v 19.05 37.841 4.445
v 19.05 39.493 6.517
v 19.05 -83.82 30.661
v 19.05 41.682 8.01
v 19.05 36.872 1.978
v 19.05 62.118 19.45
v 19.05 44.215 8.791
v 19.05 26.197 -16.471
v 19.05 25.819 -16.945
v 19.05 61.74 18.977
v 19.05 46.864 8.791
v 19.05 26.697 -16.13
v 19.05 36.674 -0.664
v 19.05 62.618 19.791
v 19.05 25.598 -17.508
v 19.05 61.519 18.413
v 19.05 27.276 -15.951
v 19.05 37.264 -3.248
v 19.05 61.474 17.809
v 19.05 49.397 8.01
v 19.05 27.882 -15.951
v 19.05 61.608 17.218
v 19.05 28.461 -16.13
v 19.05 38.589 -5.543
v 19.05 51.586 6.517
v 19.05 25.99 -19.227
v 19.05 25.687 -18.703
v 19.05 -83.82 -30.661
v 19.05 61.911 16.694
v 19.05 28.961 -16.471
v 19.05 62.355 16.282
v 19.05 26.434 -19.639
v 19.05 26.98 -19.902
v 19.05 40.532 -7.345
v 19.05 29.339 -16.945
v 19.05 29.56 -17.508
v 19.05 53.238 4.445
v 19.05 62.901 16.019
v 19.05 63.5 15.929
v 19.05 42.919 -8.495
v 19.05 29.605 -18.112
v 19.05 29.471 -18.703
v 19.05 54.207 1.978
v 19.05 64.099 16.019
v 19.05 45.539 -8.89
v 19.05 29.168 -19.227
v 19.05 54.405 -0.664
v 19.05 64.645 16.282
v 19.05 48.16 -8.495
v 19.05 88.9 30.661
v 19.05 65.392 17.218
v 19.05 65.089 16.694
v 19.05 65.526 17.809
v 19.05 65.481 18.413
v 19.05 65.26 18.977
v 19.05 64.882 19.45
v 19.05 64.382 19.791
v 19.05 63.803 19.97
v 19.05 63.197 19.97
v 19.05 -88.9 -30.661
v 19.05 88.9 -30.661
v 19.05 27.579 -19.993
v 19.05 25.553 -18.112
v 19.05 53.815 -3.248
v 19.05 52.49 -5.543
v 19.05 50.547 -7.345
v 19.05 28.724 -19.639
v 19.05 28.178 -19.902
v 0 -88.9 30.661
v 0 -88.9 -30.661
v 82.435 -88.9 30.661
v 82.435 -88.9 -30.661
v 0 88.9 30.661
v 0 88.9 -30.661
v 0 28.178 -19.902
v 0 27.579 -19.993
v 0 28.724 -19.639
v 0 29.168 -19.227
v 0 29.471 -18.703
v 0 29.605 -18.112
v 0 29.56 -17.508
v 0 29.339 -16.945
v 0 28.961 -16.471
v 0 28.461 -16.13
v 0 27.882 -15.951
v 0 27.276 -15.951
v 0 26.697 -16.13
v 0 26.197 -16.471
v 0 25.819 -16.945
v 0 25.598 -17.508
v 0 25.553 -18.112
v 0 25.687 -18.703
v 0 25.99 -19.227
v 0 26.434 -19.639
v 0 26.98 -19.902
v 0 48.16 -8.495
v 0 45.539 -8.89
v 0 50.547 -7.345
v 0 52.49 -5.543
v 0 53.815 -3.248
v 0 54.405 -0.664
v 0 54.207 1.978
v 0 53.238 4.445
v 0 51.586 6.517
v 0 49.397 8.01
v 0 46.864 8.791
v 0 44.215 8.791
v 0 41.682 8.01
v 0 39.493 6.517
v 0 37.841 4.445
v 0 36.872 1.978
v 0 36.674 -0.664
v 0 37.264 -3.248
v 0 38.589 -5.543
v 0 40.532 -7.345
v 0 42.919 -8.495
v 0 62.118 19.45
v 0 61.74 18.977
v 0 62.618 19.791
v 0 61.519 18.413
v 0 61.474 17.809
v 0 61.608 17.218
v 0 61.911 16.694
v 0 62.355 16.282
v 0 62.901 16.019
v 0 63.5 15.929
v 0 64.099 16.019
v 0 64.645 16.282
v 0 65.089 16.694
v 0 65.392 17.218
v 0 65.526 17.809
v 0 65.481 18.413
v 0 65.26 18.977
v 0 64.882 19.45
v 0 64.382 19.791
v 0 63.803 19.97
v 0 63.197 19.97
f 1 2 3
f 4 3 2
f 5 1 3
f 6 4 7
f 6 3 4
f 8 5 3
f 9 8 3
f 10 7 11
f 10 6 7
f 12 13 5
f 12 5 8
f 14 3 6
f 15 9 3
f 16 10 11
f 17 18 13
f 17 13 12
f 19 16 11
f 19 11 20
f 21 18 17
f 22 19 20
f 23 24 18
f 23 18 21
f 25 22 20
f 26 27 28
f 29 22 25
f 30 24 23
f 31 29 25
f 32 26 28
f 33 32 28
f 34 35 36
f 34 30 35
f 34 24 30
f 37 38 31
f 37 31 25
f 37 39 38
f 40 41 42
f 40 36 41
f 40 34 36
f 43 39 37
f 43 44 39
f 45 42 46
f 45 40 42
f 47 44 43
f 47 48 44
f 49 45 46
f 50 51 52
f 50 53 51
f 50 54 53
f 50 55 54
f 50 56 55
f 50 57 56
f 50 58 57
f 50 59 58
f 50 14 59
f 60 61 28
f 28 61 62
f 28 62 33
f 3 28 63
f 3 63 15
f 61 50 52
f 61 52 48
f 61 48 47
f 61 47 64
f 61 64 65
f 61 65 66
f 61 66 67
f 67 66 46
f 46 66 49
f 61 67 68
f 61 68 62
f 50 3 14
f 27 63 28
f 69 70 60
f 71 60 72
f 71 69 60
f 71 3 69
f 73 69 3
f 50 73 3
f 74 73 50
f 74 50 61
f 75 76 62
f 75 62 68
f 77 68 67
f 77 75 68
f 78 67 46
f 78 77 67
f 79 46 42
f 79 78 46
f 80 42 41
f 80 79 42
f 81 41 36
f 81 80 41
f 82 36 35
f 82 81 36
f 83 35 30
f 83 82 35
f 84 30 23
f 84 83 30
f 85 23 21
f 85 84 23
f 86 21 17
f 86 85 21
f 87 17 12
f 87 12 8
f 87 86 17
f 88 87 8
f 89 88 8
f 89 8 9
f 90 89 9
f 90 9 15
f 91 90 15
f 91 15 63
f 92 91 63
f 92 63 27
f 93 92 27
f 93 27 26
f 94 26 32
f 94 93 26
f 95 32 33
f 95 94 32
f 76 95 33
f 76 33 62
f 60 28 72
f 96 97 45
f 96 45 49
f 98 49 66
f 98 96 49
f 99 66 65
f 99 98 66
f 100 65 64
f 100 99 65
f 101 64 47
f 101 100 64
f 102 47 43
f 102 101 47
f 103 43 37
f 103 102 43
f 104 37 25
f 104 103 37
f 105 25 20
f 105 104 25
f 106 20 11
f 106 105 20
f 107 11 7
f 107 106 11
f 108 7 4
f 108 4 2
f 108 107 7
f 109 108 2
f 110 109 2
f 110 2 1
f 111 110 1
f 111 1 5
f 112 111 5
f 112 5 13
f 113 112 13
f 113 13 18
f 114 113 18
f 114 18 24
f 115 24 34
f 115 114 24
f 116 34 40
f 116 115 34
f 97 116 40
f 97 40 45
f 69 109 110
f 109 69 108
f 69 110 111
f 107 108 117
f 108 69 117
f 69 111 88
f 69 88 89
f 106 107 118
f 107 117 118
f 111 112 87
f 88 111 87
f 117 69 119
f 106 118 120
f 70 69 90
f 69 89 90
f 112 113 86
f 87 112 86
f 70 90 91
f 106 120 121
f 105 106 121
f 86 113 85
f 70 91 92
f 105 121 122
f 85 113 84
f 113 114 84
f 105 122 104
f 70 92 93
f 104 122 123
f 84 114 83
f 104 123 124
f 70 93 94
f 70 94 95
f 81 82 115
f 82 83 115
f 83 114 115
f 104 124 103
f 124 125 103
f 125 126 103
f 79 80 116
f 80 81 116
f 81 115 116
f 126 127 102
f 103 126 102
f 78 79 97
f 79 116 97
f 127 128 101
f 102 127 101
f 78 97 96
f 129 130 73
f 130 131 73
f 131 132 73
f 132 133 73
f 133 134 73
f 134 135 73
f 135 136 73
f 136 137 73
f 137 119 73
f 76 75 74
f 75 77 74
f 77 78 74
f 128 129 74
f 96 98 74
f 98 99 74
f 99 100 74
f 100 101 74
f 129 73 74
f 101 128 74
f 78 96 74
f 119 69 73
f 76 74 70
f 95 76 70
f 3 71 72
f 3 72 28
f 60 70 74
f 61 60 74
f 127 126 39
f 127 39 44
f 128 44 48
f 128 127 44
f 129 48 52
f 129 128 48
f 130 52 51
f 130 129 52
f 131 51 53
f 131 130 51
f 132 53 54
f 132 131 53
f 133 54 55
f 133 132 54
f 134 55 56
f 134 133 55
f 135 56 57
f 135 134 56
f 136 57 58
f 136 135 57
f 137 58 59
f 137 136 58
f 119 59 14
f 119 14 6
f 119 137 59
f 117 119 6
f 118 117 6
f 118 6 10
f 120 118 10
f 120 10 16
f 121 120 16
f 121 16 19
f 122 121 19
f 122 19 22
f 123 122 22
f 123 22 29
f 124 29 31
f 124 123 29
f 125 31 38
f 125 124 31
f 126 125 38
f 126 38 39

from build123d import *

# Parameters (mm, degrees)
SKETCH1_W           = 61.321024484
SKETCH1_H           = 177.8
SKETCH1_R           = 8.89
SKETCH1_R_2         = 2.032
BOSS_EXTRUDE1_DEPTH = 19.05
BOSS_EXTRUDE2_DEPTH = 61.321024


with BuildPart() as part:
    # Sketch1 → Boss-Extrude1 (new body)
    with BuildSketch(Plane(origin=(0, 0, 0), x_dir=(0, 0, -1), z_dir=(1, 0, 0))):
        Rectangle(SKETCH1_W, SKETCH1_H)
        with Locations((0, 45.539487758)):
            Circle(SKETCH1_R, mode=Mode.SUBTRACT)
        with Locations((-17.960512242, 63.5)):
            Circle(SKETCH1_R_2, mode=Mode.SUBTRACT)
        with Locations((17.960512242, 27.578975516)):
            Circle(SKETCH1_R_2, mode=Mode.SUBTRACT)
    extrude(amount=BOSS_EXTRUDE1_DEPTH)

    # Sketch2 → Boss-Extrude2 (add)
    with BuildSketch(Plane.XY.offset(30.660512242)):
        Polygon((19.05, -88.9), (82.435420259, -88.9), (19.05, -83.82), align=None)
    extrude(amount=-BOSS_EXTRUDE2_DEPTH)


solid = part.part
